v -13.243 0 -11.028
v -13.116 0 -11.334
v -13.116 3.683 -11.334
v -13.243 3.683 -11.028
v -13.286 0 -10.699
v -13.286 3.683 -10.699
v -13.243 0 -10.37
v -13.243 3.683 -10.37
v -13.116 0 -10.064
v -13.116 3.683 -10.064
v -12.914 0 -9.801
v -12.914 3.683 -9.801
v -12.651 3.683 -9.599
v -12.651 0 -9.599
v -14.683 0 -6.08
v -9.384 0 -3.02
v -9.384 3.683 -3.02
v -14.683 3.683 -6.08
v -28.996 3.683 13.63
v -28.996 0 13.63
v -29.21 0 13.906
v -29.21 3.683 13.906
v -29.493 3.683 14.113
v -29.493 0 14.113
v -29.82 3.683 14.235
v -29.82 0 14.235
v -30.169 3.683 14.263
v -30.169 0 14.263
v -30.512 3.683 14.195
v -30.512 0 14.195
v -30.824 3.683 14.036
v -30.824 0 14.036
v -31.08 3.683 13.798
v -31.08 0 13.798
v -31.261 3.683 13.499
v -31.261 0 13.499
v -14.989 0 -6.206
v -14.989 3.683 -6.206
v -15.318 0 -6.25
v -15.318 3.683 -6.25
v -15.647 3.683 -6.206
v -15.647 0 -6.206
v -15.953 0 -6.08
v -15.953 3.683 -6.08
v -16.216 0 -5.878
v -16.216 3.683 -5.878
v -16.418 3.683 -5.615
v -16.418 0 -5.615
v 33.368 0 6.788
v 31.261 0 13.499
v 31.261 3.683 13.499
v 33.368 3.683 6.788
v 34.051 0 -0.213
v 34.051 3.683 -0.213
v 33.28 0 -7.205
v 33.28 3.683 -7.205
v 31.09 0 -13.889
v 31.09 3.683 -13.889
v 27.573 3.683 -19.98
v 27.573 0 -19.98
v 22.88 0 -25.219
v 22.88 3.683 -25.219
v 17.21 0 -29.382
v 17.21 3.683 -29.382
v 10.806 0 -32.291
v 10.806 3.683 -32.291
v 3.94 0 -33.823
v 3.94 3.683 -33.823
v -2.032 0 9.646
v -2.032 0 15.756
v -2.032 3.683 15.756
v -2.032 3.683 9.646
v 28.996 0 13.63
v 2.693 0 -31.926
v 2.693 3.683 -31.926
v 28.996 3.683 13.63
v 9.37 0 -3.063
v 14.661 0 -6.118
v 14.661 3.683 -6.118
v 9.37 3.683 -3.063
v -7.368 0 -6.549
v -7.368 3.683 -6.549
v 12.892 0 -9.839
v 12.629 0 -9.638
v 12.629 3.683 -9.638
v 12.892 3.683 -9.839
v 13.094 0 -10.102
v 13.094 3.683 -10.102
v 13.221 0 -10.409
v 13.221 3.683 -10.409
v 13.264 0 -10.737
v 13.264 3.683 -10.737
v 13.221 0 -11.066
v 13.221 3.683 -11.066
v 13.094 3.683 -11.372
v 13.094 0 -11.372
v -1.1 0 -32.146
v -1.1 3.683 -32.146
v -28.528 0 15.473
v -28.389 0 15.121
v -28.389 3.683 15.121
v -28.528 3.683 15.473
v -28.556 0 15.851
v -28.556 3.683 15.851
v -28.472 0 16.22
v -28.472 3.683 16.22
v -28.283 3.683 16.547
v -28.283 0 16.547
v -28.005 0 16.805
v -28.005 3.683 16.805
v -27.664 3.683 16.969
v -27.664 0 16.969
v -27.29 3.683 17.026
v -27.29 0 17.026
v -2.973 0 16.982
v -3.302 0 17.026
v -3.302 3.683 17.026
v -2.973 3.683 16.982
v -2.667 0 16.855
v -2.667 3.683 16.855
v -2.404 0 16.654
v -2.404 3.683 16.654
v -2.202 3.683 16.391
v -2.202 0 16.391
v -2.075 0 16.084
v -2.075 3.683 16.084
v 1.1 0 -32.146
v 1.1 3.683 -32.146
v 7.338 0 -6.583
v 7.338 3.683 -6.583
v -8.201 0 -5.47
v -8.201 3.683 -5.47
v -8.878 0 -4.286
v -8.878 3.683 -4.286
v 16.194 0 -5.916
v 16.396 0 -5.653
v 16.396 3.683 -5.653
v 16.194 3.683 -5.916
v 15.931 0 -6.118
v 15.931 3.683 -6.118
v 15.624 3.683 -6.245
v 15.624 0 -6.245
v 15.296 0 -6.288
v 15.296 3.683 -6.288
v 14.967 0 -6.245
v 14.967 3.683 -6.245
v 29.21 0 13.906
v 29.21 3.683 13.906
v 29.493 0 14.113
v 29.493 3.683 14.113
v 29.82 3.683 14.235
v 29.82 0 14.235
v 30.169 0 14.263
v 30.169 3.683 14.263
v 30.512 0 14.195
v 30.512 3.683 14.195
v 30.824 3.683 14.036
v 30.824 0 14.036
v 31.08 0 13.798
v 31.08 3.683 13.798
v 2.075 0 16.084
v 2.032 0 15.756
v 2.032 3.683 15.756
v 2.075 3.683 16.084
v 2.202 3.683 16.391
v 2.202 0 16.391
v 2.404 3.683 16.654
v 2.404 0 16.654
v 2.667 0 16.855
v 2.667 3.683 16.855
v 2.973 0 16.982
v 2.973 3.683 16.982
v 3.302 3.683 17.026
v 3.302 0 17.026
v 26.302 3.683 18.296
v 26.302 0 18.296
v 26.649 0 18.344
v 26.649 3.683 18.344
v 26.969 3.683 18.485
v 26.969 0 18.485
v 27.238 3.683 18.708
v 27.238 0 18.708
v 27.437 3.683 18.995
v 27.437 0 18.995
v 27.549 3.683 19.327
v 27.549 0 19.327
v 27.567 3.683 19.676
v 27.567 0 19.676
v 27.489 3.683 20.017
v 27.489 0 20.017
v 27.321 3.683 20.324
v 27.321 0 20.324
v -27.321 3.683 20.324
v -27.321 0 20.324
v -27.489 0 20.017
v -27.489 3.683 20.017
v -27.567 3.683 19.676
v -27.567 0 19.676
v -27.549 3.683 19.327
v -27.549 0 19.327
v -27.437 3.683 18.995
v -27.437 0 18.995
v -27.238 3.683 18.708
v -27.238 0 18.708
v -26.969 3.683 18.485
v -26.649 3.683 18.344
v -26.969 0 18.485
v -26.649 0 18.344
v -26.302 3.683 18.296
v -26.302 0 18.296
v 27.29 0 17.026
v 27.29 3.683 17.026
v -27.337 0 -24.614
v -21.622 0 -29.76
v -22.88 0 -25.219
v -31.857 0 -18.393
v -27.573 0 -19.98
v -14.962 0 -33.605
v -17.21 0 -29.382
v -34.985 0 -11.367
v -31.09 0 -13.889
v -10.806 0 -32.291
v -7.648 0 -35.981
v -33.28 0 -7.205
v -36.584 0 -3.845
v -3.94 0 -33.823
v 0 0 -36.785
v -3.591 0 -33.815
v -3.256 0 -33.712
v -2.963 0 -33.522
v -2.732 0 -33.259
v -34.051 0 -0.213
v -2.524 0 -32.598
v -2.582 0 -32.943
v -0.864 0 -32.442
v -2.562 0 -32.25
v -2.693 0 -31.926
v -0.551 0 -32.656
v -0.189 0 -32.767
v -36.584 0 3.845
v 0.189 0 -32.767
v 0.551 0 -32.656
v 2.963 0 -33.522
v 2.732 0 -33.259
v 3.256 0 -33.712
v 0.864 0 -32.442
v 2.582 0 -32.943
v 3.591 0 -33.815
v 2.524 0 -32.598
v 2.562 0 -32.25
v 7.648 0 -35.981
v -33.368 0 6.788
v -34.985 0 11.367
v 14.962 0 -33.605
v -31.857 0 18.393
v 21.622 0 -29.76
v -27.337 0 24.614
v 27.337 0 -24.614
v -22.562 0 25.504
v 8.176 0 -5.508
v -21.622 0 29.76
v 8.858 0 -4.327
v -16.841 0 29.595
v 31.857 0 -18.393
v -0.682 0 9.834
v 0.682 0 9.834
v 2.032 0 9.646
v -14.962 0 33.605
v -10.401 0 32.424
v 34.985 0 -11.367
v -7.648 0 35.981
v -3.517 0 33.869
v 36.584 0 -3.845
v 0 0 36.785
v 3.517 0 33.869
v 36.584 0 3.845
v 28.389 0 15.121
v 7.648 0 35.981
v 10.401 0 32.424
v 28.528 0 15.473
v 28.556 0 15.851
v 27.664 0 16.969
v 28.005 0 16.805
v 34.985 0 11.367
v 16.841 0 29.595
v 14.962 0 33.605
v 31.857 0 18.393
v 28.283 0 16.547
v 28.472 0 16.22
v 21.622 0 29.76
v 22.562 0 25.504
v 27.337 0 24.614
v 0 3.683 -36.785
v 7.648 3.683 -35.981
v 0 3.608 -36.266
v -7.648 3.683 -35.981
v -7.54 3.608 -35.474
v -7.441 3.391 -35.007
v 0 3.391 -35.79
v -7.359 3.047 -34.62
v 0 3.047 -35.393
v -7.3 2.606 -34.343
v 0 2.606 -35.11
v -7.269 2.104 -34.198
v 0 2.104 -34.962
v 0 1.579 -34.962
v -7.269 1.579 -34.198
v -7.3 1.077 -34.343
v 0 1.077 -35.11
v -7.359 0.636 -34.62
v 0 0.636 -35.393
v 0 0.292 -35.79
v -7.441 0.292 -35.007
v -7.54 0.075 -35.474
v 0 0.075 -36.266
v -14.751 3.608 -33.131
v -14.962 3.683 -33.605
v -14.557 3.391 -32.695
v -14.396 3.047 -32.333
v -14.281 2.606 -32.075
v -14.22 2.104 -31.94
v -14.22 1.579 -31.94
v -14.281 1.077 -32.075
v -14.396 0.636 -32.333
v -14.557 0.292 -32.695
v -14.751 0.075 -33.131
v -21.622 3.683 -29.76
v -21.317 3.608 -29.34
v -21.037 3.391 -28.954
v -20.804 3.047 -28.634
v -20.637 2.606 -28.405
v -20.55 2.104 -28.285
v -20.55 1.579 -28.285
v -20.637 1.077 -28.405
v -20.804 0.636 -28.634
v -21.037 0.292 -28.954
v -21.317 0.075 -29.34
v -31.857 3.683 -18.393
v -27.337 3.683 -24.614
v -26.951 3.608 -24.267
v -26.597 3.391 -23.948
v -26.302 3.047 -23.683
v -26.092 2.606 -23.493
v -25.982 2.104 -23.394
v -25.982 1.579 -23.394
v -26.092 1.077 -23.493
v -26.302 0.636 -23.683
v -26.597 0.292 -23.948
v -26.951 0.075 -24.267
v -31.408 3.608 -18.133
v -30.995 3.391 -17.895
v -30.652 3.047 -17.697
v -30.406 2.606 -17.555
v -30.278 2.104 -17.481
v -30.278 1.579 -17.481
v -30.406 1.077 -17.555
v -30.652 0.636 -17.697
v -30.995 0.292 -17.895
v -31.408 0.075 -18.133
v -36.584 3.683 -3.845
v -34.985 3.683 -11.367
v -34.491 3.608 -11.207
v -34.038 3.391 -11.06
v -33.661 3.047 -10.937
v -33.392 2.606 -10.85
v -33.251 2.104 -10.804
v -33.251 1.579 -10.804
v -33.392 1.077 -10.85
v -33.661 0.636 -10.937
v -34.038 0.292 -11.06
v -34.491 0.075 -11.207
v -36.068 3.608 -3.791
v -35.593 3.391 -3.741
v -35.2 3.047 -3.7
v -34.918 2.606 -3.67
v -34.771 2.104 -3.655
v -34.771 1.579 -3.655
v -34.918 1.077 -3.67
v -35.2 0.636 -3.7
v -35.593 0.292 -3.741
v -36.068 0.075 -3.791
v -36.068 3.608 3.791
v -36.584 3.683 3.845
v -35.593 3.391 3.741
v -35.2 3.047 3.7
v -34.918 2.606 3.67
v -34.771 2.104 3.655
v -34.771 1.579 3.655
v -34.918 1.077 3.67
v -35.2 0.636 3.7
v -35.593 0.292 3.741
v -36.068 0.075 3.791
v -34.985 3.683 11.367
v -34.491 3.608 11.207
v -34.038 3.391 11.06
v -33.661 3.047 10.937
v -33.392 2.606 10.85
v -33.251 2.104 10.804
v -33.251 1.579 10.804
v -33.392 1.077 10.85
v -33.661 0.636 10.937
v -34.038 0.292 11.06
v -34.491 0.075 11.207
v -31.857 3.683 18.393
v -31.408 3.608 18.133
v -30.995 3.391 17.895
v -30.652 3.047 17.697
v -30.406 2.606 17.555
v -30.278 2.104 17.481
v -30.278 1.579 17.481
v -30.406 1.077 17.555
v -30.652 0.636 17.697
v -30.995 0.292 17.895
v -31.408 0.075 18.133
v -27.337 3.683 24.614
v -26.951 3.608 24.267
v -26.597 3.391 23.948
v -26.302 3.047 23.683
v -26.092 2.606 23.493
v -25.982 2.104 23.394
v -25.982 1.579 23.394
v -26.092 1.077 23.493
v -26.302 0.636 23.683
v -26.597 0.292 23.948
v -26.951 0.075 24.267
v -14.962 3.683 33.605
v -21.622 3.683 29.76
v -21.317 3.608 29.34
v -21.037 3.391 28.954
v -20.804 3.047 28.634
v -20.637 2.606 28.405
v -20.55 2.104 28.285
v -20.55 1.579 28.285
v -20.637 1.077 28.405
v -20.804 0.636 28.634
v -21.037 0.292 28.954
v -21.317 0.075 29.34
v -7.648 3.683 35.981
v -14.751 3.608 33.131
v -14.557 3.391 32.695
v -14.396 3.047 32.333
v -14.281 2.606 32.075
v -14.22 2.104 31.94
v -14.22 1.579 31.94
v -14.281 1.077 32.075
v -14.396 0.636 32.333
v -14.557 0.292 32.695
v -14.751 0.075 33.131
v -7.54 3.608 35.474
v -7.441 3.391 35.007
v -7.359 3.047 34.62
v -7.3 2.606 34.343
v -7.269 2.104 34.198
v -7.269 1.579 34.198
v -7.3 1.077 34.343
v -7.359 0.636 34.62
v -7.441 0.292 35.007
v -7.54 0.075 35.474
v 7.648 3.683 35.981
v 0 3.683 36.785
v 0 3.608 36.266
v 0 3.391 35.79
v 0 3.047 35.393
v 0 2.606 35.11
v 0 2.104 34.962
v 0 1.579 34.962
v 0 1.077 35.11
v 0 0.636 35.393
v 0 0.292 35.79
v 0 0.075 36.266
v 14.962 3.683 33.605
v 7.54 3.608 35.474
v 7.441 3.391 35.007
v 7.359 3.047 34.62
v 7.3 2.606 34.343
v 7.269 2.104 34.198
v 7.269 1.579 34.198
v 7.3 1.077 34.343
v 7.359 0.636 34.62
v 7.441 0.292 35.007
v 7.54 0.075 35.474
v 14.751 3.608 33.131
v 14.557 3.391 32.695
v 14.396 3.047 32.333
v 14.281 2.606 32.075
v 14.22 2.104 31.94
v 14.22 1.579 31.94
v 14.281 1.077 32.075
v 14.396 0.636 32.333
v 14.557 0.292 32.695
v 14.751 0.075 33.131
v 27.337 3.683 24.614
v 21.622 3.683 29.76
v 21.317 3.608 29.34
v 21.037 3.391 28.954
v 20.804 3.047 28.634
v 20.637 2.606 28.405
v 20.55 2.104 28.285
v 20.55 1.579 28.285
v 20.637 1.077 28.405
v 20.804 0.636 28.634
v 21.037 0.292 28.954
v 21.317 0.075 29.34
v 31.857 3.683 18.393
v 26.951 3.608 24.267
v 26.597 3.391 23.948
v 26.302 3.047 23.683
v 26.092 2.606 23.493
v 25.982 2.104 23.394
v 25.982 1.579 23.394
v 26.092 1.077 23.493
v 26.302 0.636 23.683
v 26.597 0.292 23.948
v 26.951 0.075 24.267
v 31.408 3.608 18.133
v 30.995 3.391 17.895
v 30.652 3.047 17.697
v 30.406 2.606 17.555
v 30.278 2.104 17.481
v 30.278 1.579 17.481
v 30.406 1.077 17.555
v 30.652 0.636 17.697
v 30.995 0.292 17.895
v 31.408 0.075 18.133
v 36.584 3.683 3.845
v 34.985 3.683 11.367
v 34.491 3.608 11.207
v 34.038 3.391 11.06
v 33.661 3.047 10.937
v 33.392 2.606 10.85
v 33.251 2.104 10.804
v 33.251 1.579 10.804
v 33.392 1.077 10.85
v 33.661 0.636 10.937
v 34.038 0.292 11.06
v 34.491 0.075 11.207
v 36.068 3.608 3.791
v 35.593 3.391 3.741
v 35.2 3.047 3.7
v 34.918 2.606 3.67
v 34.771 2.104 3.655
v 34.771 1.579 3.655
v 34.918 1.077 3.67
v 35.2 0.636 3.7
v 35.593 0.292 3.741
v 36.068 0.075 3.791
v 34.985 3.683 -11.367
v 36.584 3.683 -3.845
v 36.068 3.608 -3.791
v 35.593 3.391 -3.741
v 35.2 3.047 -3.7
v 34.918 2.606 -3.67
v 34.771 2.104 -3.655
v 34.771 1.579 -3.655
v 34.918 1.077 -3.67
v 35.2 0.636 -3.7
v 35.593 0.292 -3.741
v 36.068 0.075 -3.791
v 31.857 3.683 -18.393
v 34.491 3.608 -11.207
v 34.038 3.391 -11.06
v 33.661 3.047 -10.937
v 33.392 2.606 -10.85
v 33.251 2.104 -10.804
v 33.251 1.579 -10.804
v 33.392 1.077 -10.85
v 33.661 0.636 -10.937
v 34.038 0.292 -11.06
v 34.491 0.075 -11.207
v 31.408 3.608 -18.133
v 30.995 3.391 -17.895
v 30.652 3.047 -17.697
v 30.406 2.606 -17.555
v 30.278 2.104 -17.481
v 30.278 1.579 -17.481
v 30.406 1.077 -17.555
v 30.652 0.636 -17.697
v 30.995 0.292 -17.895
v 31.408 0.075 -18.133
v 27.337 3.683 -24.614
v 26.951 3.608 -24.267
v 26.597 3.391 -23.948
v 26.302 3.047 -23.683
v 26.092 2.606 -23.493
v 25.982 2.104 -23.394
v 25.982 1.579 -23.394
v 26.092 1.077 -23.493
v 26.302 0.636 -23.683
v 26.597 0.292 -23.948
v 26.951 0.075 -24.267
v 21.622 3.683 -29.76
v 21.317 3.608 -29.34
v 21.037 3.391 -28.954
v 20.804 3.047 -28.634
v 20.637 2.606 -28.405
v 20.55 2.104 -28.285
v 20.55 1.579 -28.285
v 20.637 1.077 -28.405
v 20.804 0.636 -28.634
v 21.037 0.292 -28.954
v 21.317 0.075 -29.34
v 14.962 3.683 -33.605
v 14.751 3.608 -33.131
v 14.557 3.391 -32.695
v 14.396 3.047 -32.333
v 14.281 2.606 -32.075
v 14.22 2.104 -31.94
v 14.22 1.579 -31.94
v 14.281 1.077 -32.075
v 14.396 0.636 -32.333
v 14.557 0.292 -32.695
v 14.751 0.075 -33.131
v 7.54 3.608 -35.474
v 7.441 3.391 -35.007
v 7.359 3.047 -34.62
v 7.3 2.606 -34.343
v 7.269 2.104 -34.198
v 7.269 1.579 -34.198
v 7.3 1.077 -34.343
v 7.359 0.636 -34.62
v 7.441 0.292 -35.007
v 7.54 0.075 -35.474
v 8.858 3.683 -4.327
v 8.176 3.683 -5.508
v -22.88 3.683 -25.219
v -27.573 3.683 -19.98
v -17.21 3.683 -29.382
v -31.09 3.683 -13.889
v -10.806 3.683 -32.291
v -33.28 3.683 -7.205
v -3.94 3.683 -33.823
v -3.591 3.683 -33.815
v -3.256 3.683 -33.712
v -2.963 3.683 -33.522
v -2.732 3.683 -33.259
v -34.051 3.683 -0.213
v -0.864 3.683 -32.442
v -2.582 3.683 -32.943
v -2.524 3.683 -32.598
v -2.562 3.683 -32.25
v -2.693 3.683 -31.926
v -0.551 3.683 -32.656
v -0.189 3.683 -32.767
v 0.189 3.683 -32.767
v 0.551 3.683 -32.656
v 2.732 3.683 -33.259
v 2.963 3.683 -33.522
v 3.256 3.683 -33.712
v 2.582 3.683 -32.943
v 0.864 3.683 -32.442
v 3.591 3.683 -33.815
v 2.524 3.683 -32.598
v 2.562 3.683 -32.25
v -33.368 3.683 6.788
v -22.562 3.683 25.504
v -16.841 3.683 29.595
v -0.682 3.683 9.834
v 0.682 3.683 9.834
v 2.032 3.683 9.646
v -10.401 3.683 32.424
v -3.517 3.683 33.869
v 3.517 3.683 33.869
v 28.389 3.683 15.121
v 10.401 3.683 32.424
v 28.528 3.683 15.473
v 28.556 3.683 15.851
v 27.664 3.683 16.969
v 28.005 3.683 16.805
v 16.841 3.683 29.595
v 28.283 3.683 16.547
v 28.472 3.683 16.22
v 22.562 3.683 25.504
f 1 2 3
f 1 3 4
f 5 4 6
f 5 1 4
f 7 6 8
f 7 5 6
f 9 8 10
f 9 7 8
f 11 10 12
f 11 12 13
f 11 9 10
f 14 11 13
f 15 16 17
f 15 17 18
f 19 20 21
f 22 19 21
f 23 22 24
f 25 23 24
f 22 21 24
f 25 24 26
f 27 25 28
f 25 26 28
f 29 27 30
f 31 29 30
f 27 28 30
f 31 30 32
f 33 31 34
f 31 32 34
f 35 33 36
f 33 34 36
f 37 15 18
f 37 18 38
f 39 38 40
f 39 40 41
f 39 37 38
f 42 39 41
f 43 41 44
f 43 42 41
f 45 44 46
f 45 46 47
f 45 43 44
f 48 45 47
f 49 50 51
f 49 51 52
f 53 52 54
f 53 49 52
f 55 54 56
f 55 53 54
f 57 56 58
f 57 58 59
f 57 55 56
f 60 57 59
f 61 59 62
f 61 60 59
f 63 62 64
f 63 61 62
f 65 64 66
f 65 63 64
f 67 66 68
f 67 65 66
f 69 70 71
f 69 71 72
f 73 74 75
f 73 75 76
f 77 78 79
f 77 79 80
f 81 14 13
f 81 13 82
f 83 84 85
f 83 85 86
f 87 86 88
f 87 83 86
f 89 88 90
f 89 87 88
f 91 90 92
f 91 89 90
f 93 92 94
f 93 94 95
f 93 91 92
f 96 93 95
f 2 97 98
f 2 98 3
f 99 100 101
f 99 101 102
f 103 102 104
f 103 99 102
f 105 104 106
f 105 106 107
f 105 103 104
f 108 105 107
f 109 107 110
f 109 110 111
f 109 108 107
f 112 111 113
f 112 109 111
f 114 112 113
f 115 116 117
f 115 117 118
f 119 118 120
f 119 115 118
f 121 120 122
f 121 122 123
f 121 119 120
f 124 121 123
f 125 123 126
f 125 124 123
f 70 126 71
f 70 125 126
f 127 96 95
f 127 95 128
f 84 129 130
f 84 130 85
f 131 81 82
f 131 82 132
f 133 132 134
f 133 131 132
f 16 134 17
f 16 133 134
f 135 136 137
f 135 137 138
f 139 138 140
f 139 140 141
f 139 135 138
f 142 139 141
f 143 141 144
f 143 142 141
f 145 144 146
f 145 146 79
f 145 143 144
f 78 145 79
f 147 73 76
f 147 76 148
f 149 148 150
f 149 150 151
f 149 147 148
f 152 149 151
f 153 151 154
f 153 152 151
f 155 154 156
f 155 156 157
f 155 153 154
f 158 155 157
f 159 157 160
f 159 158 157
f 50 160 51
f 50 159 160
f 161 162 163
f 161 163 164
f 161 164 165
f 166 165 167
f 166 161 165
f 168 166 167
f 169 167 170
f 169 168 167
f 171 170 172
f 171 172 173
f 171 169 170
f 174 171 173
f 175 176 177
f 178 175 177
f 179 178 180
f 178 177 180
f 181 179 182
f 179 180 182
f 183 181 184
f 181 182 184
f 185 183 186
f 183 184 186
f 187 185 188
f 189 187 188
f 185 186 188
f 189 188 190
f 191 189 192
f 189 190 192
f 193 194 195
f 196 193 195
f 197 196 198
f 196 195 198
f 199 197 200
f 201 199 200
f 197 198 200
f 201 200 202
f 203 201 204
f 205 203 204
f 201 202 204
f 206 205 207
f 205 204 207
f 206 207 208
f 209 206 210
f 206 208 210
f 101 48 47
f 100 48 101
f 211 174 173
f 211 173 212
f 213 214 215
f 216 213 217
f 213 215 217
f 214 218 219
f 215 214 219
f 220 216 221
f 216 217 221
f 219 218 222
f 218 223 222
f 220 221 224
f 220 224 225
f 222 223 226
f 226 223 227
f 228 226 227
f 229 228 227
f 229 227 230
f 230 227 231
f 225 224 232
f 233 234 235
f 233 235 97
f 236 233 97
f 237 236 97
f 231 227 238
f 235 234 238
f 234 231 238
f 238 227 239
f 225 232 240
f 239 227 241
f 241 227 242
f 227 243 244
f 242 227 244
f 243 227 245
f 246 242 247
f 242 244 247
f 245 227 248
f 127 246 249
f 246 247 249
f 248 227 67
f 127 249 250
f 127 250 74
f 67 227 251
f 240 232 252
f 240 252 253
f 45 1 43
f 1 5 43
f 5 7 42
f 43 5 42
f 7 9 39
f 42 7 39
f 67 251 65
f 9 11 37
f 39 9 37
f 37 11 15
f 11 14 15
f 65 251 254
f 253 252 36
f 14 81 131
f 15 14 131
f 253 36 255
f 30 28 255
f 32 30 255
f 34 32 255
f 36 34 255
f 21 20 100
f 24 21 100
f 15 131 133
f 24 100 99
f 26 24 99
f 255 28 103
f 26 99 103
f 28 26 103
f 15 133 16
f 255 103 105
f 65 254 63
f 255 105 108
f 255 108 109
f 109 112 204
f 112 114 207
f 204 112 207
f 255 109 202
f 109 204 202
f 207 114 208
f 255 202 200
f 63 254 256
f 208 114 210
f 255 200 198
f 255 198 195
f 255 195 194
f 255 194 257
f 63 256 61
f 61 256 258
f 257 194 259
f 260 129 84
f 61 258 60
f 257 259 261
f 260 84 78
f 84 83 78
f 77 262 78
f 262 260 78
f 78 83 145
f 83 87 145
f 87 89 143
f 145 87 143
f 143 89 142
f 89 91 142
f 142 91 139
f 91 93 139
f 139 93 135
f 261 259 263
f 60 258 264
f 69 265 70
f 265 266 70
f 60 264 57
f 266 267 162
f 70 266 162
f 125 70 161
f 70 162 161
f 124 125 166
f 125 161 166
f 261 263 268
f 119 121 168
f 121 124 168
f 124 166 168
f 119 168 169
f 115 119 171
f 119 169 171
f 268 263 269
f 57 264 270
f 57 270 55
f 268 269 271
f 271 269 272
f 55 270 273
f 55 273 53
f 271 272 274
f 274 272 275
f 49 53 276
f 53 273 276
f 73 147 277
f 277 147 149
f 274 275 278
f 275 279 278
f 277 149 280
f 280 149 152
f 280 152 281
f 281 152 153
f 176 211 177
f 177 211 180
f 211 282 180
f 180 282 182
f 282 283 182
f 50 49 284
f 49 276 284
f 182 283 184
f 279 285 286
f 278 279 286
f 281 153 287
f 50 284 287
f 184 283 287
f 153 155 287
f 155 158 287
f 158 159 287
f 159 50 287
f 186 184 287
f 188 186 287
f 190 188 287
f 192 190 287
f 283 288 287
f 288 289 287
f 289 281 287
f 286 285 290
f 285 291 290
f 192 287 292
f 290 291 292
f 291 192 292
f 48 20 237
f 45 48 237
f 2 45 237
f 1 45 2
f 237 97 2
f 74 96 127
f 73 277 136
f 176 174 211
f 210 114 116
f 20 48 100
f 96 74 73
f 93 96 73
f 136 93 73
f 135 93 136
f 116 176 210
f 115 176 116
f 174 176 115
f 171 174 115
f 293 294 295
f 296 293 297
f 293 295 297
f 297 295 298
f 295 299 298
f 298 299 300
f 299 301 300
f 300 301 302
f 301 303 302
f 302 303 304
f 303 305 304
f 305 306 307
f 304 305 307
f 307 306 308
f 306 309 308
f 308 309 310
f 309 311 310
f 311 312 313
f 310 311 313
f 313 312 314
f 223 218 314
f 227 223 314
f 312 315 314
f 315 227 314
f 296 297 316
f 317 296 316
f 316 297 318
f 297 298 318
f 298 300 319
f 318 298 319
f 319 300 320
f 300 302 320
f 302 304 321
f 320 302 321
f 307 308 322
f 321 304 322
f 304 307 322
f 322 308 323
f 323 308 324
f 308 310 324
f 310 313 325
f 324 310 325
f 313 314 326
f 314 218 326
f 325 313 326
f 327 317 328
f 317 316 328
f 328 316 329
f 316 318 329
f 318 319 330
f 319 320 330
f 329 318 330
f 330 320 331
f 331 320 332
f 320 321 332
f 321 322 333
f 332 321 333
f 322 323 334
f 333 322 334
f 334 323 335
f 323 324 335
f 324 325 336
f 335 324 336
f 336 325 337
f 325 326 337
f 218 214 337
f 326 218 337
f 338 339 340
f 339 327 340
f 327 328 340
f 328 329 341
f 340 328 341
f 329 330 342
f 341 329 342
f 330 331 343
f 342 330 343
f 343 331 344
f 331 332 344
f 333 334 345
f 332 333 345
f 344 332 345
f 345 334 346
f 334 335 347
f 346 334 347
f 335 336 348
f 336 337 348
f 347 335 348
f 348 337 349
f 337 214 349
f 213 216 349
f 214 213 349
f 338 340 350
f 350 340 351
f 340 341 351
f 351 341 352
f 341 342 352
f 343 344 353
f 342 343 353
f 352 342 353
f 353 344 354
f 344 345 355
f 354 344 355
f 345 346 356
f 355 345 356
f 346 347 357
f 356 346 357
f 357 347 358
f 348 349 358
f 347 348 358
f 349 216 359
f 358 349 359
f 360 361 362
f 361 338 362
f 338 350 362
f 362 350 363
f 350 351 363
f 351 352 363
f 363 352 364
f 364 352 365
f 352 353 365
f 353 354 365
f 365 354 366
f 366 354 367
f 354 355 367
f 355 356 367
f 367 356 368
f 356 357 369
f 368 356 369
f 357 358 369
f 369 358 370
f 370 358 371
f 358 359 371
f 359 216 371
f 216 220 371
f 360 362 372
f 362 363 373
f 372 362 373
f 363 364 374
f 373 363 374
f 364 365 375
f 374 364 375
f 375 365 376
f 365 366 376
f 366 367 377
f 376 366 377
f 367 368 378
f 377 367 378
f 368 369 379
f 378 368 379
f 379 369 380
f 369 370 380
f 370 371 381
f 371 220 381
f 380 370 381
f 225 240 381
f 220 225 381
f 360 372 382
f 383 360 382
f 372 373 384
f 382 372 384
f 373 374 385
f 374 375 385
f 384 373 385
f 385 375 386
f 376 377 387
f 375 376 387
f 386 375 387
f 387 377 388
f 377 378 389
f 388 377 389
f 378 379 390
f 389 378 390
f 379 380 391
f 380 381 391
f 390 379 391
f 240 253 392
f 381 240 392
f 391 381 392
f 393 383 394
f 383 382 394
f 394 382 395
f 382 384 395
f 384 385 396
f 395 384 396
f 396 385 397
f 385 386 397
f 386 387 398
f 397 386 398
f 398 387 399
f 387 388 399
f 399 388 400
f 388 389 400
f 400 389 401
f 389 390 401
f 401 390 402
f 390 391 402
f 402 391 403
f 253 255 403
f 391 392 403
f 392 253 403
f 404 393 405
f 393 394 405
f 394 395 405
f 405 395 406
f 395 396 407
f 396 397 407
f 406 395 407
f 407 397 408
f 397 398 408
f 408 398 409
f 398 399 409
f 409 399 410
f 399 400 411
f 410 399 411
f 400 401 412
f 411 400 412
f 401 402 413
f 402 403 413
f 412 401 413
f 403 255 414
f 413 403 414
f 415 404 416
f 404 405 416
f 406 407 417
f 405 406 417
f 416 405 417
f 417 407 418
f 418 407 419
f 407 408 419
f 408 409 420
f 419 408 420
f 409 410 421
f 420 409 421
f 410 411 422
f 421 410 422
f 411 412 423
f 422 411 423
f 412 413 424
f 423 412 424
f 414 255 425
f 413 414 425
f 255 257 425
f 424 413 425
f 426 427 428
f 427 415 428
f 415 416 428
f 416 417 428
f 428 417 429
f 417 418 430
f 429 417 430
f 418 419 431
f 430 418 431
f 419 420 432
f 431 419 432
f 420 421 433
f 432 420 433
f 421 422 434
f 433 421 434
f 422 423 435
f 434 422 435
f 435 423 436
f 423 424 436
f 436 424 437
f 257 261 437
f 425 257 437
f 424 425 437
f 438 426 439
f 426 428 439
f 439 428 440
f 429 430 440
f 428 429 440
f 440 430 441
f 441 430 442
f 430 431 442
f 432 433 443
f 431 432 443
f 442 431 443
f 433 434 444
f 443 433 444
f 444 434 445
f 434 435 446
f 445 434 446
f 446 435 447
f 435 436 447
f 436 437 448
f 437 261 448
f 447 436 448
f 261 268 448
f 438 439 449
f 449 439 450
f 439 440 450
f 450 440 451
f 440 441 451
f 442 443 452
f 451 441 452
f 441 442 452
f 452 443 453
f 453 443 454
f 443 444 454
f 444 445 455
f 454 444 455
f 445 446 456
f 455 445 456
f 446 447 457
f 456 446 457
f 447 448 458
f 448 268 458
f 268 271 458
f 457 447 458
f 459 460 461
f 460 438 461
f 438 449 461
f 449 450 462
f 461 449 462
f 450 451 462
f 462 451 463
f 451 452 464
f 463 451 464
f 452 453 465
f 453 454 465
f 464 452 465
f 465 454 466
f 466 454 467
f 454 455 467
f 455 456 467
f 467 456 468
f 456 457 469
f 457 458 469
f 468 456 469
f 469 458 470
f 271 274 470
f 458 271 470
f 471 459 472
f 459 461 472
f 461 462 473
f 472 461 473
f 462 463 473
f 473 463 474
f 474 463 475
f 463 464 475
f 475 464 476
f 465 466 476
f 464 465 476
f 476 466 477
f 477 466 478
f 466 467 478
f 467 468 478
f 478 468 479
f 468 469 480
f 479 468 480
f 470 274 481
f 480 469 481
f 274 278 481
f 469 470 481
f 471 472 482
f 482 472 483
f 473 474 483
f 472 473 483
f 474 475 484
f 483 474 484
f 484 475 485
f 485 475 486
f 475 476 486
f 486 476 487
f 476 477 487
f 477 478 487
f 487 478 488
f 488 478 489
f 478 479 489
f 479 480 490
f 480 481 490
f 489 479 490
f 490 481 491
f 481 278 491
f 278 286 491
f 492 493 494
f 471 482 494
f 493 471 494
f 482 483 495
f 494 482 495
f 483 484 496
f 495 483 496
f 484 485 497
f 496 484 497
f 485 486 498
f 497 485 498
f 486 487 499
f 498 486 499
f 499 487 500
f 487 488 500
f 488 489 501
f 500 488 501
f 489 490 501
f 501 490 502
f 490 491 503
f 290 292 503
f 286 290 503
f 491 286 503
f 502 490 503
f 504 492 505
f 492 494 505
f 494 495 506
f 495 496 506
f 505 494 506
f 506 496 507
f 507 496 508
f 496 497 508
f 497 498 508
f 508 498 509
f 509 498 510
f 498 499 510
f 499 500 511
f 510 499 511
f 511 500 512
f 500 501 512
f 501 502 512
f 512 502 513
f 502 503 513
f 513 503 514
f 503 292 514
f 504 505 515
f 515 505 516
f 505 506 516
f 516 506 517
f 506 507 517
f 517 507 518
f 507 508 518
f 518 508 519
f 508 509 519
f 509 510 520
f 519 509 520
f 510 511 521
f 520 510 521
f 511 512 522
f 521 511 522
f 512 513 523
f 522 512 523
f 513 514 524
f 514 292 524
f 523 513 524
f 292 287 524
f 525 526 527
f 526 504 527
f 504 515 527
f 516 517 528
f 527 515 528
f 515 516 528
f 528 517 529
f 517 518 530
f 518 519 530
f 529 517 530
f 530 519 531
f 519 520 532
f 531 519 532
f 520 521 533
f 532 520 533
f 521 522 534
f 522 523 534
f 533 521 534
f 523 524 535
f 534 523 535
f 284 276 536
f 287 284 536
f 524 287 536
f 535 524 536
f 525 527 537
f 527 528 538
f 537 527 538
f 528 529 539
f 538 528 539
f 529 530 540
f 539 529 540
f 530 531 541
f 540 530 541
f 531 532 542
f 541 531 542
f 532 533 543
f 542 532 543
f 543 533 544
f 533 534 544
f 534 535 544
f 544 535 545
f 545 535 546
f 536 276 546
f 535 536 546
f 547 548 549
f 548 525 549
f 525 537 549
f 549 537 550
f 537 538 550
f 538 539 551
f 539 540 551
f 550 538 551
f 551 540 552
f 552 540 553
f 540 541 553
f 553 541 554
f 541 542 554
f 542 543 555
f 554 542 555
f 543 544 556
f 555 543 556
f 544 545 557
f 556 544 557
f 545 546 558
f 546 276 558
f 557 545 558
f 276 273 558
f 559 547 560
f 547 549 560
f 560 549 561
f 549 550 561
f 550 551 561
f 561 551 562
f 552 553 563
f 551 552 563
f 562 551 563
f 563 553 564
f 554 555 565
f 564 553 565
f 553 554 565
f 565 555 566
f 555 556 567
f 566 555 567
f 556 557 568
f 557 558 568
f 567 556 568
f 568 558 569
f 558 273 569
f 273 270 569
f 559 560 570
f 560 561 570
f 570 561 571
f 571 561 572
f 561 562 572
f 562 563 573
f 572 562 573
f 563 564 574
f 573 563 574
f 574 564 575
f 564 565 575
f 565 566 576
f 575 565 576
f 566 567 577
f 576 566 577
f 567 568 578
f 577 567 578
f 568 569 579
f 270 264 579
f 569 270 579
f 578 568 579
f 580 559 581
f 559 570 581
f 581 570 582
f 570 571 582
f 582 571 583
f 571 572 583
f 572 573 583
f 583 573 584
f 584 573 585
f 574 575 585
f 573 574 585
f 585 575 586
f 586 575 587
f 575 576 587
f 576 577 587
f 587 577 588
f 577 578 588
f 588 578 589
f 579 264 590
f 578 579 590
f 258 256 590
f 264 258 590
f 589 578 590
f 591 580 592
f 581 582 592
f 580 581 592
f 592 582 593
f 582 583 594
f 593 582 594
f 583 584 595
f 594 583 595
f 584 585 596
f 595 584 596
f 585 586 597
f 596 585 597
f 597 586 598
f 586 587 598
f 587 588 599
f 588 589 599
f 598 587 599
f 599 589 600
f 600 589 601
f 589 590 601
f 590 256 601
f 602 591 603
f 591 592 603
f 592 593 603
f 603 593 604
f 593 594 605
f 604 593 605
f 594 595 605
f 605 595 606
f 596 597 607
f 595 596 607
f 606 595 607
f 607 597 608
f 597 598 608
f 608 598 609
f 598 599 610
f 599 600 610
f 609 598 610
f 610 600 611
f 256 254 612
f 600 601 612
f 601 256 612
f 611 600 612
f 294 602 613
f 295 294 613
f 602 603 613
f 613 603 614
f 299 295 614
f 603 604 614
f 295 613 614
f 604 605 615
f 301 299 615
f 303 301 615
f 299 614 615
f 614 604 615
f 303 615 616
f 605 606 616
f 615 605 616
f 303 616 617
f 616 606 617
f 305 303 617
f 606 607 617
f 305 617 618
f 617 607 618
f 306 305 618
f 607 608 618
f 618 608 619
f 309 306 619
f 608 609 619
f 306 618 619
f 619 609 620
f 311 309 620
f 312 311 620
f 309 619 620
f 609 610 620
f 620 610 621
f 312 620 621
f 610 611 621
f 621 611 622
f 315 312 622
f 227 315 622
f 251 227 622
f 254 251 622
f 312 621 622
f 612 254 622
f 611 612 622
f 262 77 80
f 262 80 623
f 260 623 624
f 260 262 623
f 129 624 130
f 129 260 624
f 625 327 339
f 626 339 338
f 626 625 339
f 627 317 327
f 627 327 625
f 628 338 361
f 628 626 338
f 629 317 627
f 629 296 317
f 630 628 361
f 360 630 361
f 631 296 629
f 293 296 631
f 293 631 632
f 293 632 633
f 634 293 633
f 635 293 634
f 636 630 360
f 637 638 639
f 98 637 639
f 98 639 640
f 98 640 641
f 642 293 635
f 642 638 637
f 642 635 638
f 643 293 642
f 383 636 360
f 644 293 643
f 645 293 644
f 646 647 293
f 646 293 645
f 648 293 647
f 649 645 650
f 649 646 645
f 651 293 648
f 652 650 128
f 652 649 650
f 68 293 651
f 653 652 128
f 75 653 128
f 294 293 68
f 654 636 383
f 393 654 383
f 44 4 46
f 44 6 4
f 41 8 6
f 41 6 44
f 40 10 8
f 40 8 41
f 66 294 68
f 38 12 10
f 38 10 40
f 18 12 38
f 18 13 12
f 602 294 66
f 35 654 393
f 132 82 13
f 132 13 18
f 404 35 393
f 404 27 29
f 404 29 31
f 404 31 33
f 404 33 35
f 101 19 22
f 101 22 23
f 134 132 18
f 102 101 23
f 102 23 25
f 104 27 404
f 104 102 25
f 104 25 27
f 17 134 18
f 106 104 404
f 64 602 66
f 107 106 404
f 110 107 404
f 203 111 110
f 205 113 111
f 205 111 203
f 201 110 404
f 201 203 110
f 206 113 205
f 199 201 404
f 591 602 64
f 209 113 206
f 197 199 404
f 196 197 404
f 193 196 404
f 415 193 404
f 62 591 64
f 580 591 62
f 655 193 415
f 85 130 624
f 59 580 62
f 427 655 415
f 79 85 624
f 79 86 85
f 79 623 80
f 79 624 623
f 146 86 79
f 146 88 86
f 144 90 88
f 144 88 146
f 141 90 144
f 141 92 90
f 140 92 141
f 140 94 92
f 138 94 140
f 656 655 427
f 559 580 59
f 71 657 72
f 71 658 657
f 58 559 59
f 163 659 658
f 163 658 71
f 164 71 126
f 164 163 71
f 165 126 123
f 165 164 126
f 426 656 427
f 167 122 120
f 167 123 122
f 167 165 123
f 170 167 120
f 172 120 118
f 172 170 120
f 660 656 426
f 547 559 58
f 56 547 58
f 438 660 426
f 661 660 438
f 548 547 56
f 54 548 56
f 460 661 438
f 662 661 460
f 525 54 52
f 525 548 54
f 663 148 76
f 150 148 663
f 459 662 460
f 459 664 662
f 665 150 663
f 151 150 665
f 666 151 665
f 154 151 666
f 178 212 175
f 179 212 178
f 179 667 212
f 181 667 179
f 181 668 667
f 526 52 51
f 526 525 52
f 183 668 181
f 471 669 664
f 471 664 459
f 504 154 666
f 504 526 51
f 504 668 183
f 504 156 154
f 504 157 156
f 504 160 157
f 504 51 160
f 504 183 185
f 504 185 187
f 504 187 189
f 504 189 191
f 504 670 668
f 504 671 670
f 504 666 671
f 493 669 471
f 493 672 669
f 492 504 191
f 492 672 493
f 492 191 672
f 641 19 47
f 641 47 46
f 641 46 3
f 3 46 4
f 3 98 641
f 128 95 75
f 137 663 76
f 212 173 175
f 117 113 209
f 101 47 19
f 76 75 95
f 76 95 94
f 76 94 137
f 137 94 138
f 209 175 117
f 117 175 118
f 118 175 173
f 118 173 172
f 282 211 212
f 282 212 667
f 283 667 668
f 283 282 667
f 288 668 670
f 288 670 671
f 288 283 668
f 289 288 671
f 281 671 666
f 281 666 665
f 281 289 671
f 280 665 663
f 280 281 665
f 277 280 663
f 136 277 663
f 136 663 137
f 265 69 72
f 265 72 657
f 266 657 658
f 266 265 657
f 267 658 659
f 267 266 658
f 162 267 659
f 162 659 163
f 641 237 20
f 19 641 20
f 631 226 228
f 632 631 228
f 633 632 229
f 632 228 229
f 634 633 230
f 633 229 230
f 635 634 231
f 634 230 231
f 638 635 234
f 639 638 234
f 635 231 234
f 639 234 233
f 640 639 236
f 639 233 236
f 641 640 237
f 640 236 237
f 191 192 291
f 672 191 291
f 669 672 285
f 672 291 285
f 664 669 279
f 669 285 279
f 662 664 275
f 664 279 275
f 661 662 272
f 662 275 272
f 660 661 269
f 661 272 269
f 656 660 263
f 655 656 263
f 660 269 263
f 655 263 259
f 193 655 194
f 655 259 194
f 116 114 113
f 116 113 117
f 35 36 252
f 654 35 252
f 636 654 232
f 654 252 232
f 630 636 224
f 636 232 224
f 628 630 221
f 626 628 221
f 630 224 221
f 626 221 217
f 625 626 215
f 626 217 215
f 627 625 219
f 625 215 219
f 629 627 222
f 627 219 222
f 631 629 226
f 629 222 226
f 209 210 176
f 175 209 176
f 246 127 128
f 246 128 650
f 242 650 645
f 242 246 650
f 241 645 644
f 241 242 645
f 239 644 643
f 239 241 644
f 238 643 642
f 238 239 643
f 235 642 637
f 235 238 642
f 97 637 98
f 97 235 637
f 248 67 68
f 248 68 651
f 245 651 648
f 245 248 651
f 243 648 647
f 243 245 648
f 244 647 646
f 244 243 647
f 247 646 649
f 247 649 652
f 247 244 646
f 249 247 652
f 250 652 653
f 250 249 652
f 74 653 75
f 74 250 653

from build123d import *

# Parameters (mm, degrees)
SKETCH1_R           = 36.785134715
BOSS_EXTRUDE1_DEPTH = 3.683
SKETCH2_R           = 1.8415


with BuildPart() as part:
    # Sketch1 → Boss-Extrude1 (new body)
    with BuildSketch(Plane(origin=(0, 0, 0), x_dir=(1, 0, 0), z_dir=(0, 1, 0))):
        Circle(SKETCH1_R)
        with BuildLine():
            Line((-1.099852263, 32.146289174), (-13.115875302, 11.333926765))
            ThreePointArc((-13.115875302, 11.333926765), (-13.242748838, 10.370226578), (-12.651023039, 9.599074503))
            Line((-12.651023039, 9.599074503), (-7.368281269, 6.549082119))
            ThreePointArc((-7.368281269, 6.549082119), (-8.559992893, 4.889638753), (-9.384056343, 3.020187413))
            Line((-9.384056343, 3.020187413), (-14.683023039, 6.079547262))
            ThreePointArc((-14.683023039, 6.079547262), (-15.646723226, 6.206420798), (-16.417875302, 5.614694999))
            Line((-16.417875302, 5.614694999), (-28.389429193, -15.120644587))
            ThreePointArc((-28.389429193, -15.120644587), (-28.389429193, -16.390644587), (-27.289576931, -17.025644587))
            Line((-27.289576931, -17.025644587), (-3.302, -17.025644587))
            ThreePointArc((-3.302, -17.025644587), (-2.403974388, -16.653670199), (-2.032, -15.755644587))
            Line((-2.032, -15.755644587), (-2.032, -9.646399404))
            ThreePointArc((-2.032, -9.646399404), (0, -9.858095427), (2.032, -9.646399404))
            Line((2.032, -9.646399404), (2.032, -15.755644587))
            ThreePointArc((2.032, -15.755644587), (2.403974388, -16.653670199), (3.302, -17.025644587))
            Line((3.302, -17.025644587), (27.289576931, -17.025644587))
            ThreePointArc((27.289576931, -17.025644587), (28.389429193, -16.390644587), (28.389429193, -15.120644587))
            Line((28.389429193, -15.120644587), (16.395640728, 5.65320641))
            ThreePointArc((16.395640728, 5.65320641), (15.624488653, 6.24493221), (14.660788465, 6.118058673))
            Line((14.660788465, 6.118058673), (9.370026939, 3.063436081))
            ThreePointArc((9.370026939, 3.063436081), (8.537361073, 4.929047714), (7.338026939, 6.582963322))
            Line((7.338026939, 6.582963322), (12.628788465, 9.637585914))
            ThreePointArc((12.628788465, 9.637585914), (13.220514265, 10.408737989), (13.093640728, 11.372438177))
            Line((13.093640728, 11.372438177), (1.099852263, 32.146289174))
            ThreePointArc((1.099852263, 32.146289174), (0, 32.781289174), (-1.099852263, 32.146289174))
        make_face(mode=Mode.SUBTRACT)
        with BuildLine():
            Line((-2.693461931, 31.926076262), (-28.995524051, -13.630431675))
            ThreePointArc((-28.995524051, -13.630431675), (-30.168979582, -14.26329703), (-31.261319719, -13.498895652))
            ThreePointArc((-31.261319719, -13.498895652), (-29.489281456, 17.025644587), (-3.940273302, 33.822544859))
            ThreePointArc((-3.940273302, 33.822544859), (-2.732112221, 33.258751239), (-2.693461931, 31.926076262))
        make_face(mode=Mode.SUBTRACT)
        with BuildLine():
            Line((2.693461931, 31.926076262), (28.995524051, -13.630431675))
            ThreePointArc((28.995524051, -13.630431675), (30.168979582, -14.26329703), (31.261319719, -13.498895652))
            ThreePointArc((31.261319719, -13.498895652), (29.489281456, 17.025644587), (3.940273302, 33.822544859))
            ThreePointArc((3.940273302, 33.822544859), (2.732112221, 33.258751239), (2.693461931, 31.926076262))
        make_face(mode=Mode.SUBTRACT)
        with BuildLine():
            Line((-26.302062121, -18.295644587), (26.302062121, -18.295644587))
            ThreePointArc((26.302062121, -18.295644587), (27.436867361, -18.995454209), (27.321046417, -20.323649206))
            ThreePointArc((27.321046417, -20.323649206), (0, -34.051289174), (-27.321046417, -20.323649206))
            ThreePointArc((-27.321046417, -20.323649206), (-27.436867361, -18.995454209), (-26.302062121, -18.295644587))
        make_face(mode=Mode.SUBTRACT)
    extrude(amount=BOSS_EXTRUDE1_DEPTH)

    # Sketch2 → Cut-Revolve2 (revolve, cut)
    with BuildSketch(Plane.XY):
        with Locations((36.785134715, 1.8415)):
            Circle(SKETCH2_R)
    revolve(axis=Axis((0, 0, 0), (0, 1, 0)), mode=Mode.SUBTRACT)


solid = part.part
